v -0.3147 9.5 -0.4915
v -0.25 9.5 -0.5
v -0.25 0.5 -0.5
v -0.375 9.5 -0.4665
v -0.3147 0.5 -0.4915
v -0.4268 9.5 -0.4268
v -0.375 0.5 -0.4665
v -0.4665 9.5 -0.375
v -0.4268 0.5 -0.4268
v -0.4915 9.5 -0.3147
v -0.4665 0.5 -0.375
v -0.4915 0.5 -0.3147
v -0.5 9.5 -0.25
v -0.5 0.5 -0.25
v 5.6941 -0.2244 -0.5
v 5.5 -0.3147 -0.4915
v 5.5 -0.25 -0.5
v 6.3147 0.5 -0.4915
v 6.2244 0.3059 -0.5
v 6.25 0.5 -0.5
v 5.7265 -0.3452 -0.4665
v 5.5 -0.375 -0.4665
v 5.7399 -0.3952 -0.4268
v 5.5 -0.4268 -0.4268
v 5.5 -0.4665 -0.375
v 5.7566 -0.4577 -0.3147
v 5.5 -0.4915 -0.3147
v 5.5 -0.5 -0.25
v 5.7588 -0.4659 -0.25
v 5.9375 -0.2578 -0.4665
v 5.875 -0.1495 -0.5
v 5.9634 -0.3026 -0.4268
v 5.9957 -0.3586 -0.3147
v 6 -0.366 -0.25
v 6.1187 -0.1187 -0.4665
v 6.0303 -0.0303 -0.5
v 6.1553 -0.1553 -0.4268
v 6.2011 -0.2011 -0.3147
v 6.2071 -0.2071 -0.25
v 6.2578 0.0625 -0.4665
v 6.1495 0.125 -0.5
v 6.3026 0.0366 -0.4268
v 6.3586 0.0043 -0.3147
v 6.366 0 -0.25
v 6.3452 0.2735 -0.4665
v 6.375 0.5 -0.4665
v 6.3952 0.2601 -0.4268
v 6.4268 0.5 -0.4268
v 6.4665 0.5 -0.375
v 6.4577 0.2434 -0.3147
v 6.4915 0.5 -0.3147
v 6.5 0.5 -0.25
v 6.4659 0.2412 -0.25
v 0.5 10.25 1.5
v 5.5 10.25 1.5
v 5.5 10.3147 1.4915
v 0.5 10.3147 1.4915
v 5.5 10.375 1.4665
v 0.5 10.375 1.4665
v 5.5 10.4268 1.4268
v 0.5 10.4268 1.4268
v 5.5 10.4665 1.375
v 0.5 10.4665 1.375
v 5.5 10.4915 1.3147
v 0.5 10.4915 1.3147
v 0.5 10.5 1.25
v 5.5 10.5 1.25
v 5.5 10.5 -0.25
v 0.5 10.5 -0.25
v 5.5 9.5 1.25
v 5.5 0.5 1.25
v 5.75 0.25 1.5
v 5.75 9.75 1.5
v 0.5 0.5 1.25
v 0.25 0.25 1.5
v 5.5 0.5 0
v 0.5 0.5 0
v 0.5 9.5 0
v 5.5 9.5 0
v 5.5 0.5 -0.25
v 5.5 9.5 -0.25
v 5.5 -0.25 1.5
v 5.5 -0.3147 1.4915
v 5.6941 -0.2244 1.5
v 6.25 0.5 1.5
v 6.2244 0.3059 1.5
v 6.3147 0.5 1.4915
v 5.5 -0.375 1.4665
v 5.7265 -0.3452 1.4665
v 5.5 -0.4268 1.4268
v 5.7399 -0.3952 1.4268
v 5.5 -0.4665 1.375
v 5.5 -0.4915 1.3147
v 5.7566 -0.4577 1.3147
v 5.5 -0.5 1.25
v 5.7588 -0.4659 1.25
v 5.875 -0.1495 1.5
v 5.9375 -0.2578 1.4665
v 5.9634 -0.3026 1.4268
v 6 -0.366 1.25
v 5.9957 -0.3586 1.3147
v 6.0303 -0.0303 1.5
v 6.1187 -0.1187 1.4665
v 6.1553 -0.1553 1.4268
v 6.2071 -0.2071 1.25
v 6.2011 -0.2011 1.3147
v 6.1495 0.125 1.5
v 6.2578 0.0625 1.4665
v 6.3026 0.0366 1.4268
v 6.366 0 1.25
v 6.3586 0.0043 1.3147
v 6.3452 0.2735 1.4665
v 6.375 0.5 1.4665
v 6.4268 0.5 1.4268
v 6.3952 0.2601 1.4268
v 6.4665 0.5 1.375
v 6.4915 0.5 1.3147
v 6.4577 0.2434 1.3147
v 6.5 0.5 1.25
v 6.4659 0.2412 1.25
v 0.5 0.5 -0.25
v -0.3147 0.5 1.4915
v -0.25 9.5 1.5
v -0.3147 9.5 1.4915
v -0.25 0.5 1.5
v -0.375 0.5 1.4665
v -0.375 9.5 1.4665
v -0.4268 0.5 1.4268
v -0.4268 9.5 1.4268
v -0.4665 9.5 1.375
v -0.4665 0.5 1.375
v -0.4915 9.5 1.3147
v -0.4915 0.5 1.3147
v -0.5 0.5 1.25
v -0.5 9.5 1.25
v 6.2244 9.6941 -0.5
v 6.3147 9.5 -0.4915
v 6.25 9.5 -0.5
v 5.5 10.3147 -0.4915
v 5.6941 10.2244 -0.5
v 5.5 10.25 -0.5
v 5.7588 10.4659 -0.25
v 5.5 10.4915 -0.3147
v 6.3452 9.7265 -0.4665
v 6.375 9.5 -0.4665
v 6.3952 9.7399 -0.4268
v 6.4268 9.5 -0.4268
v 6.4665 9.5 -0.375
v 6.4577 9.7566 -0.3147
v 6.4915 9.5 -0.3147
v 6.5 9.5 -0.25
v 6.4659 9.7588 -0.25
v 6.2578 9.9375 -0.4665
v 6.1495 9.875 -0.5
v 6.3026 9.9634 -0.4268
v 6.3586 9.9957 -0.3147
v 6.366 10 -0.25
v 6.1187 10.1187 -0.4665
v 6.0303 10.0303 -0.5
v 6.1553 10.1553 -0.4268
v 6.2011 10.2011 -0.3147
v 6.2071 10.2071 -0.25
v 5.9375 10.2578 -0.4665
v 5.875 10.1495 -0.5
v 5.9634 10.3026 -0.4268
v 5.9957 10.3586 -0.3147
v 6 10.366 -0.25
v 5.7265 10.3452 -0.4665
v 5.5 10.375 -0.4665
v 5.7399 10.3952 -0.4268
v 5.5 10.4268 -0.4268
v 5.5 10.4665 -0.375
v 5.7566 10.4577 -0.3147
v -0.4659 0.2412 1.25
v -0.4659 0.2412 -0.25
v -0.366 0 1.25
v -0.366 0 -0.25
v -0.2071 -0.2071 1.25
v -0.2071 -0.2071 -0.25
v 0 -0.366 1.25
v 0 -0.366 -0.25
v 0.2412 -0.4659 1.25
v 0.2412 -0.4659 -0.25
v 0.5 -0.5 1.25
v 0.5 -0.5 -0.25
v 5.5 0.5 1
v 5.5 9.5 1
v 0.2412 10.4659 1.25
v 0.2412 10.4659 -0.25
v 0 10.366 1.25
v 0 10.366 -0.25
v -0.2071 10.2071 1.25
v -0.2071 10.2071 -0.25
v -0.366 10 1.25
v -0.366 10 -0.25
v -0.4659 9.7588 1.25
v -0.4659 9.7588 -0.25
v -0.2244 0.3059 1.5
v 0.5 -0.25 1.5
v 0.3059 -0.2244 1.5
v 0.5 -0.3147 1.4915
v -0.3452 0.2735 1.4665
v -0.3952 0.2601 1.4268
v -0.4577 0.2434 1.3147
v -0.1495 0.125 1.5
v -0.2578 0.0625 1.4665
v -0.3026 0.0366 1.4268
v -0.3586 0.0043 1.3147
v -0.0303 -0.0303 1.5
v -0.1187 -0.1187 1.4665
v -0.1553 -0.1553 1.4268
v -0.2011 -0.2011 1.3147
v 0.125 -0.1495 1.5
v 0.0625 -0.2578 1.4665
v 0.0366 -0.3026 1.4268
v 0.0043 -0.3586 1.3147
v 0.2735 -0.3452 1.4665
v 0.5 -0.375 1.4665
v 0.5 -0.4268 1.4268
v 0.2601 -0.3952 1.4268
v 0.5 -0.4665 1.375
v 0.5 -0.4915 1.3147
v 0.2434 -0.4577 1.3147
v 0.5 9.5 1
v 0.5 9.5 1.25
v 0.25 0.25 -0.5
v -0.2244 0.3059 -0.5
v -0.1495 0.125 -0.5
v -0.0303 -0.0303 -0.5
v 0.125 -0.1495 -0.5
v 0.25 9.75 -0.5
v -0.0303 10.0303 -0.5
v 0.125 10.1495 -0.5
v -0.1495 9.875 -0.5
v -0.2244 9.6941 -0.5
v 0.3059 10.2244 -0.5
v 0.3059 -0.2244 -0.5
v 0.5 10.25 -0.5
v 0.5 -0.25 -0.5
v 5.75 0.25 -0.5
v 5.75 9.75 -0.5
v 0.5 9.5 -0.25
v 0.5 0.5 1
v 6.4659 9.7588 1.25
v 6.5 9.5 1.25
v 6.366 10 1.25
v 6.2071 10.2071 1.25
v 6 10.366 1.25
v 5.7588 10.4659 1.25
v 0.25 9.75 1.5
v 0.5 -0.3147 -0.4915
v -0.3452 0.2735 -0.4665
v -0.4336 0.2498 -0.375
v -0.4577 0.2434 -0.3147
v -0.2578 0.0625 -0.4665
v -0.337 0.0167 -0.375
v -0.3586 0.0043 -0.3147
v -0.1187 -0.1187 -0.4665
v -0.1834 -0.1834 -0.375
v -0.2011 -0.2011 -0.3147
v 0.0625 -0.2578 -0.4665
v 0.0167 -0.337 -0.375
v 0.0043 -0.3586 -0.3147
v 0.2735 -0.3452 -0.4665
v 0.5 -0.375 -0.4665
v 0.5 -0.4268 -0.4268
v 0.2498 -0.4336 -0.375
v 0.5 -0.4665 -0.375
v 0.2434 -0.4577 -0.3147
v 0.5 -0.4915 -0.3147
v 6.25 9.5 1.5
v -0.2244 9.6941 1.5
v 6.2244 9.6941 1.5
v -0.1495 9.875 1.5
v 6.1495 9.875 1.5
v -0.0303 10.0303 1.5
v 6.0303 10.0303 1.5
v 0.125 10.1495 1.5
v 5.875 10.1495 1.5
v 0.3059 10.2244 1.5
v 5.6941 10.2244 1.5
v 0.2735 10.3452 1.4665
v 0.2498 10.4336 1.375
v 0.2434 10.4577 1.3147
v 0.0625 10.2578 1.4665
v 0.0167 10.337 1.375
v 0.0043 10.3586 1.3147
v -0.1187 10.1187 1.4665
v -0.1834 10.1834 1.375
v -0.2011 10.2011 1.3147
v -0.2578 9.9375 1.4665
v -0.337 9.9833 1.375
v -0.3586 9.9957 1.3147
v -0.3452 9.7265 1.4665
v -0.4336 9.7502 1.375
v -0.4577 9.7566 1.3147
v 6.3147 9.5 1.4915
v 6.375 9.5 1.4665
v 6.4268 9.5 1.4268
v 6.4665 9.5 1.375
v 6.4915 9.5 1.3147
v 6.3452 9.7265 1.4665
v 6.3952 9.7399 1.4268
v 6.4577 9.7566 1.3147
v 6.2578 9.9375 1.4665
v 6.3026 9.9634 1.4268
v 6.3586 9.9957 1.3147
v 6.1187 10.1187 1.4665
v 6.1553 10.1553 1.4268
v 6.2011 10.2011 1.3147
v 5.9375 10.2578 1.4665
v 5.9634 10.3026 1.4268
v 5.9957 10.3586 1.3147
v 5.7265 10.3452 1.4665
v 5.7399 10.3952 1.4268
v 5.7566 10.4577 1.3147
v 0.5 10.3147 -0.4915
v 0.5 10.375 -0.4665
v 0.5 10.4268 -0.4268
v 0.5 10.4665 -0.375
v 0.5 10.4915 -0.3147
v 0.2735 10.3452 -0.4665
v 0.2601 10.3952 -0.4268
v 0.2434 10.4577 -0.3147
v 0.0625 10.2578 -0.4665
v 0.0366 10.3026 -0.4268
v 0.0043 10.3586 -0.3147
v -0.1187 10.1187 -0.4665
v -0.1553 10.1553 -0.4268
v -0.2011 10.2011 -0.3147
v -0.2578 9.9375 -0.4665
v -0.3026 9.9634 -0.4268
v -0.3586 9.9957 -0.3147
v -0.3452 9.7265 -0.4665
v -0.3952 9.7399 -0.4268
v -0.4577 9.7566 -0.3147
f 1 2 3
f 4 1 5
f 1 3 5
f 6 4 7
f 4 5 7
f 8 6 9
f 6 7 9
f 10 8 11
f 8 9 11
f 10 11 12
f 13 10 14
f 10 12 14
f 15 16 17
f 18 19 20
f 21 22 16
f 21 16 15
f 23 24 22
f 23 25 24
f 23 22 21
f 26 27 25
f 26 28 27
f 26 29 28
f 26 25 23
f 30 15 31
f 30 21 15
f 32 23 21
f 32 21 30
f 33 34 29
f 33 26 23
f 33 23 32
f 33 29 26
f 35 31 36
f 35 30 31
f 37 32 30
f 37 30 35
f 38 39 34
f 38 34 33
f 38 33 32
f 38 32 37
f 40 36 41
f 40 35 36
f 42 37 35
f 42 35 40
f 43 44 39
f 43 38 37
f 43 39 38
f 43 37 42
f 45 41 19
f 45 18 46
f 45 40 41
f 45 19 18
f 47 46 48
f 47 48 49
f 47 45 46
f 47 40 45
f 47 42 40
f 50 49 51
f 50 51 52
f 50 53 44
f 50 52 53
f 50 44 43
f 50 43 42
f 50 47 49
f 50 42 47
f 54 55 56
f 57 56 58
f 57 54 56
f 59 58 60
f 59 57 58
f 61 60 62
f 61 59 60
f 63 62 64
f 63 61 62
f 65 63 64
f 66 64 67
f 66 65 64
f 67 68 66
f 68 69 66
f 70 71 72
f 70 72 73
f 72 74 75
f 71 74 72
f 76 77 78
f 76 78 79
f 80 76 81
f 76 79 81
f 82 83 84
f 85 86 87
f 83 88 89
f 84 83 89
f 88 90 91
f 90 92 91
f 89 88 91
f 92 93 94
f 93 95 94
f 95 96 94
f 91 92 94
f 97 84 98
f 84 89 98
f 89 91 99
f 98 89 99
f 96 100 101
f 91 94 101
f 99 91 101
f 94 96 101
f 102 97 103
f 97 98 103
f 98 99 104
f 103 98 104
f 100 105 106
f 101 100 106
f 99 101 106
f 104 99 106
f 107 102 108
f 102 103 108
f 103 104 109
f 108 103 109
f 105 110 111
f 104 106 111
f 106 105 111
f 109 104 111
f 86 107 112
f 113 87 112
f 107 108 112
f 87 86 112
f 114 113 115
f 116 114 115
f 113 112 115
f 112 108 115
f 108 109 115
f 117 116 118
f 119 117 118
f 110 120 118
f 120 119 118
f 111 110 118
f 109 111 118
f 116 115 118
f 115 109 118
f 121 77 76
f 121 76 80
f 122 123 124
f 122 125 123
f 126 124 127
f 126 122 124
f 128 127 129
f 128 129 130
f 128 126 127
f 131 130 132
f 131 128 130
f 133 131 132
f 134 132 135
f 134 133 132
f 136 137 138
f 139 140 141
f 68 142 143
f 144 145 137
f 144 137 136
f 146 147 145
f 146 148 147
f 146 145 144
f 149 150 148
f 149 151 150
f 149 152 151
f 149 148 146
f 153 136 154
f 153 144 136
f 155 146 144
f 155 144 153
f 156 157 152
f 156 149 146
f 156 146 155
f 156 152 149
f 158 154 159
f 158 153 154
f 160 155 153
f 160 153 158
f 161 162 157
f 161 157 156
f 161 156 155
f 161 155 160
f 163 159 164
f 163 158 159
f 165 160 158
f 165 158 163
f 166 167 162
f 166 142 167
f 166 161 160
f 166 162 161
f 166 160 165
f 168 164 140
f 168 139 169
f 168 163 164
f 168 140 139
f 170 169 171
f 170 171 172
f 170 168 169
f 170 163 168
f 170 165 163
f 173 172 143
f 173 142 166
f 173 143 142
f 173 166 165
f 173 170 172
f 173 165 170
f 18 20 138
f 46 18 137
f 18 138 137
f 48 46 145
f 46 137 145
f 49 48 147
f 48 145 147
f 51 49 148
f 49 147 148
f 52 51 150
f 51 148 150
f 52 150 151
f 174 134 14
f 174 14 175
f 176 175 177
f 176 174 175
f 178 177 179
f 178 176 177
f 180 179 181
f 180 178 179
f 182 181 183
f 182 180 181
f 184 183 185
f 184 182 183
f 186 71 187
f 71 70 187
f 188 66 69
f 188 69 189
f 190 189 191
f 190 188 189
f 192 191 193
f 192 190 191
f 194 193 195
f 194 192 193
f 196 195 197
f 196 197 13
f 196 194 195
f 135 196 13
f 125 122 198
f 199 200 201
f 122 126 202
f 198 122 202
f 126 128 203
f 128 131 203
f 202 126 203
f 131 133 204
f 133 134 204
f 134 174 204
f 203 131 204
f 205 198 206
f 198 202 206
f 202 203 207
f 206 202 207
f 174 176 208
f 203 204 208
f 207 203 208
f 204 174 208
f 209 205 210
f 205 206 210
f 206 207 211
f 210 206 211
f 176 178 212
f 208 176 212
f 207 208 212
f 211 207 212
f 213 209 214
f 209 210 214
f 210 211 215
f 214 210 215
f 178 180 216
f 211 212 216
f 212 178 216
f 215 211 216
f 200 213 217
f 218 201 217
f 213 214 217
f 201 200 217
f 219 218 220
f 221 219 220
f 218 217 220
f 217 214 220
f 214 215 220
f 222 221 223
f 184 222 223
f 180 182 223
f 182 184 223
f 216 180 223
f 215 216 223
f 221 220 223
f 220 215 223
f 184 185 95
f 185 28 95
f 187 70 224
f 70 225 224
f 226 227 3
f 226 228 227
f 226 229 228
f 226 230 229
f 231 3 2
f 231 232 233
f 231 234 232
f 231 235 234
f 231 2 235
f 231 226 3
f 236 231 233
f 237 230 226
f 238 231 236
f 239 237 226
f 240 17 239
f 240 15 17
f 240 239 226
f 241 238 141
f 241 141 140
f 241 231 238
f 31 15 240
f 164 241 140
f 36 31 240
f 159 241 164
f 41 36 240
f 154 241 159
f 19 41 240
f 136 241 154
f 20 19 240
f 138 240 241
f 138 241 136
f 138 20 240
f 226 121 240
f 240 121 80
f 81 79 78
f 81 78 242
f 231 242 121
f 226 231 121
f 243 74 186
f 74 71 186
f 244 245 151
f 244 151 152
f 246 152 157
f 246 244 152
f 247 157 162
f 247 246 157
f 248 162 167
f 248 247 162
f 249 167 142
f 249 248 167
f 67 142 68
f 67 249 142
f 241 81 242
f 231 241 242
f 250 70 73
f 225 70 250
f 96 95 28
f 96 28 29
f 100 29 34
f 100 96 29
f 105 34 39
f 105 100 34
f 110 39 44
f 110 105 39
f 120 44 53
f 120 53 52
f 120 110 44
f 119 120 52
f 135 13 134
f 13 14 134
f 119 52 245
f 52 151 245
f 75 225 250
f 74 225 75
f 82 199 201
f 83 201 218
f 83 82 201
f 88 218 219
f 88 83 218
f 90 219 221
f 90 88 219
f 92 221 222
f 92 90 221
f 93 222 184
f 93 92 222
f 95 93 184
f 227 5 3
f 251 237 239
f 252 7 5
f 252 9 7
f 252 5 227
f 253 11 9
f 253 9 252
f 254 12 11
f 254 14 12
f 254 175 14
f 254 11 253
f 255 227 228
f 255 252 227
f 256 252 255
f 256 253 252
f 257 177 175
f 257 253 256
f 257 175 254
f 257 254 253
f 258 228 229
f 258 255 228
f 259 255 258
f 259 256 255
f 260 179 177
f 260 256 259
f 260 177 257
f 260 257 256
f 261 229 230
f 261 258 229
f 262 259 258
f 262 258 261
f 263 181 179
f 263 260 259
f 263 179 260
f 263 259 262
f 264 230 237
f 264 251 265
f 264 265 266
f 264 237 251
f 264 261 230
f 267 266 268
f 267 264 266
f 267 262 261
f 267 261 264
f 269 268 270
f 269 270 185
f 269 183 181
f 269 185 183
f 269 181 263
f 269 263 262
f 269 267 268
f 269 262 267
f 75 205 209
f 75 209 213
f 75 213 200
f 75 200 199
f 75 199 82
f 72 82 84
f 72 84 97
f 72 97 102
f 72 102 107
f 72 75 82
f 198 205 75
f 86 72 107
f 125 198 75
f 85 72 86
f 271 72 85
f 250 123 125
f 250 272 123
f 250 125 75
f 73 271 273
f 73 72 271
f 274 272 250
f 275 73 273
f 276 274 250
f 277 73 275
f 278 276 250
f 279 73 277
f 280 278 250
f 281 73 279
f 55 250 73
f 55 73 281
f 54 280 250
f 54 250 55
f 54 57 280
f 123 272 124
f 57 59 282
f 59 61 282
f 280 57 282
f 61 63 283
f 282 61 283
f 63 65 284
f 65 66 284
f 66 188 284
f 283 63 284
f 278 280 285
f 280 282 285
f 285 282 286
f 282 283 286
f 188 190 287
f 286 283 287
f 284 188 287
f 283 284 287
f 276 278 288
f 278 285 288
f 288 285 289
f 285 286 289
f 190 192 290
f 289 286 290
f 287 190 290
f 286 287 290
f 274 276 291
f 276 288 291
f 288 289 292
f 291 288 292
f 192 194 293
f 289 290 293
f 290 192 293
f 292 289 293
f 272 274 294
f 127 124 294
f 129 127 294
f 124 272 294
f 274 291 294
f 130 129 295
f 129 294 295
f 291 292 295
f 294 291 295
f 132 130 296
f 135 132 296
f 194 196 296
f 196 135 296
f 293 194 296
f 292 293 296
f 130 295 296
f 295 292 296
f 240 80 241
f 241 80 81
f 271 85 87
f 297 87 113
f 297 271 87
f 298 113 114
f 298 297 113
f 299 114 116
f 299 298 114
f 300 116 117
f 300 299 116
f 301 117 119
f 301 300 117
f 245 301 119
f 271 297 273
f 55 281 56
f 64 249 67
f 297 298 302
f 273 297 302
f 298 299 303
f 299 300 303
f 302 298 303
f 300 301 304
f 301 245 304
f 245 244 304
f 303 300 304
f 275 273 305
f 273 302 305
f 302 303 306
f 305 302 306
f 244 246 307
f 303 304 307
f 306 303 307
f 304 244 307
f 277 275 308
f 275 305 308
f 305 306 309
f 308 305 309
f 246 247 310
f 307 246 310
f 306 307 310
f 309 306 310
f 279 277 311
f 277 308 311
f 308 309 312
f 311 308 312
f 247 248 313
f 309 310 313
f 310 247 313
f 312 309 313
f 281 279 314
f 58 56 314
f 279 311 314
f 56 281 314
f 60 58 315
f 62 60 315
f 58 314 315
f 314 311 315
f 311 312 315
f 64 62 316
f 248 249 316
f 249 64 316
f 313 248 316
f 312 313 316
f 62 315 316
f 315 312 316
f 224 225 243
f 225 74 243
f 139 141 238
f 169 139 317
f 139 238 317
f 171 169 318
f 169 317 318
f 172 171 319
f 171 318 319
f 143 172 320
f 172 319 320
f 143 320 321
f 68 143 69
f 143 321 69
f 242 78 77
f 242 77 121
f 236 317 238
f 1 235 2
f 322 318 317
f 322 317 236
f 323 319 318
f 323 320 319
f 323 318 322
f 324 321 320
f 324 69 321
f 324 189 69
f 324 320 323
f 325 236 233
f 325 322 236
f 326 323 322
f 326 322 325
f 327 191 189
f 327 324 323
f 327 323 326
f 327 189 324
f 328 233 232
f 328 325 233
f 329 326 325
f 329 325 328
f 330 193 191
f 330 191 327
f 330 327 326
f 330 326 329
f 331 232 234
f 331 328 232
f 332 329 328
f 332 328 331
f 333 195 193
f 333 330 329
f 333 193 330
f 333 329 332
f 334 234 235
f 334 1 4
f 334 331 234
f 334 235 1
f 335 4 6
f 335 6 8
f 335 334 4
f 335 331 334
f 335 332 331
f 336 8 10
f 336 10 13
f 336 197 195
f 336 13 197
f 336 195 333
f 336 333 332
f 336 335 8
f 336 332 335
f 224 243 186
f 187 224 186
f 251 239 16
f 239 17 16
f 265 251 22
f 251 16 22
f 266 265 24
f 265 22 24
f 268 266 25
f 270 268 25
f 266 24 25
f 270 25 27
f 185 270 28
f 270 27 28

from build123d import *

# Parameters (mm, degrees)
F0_W     = 6
F0_H     = 10
F1_DEPTH = 1
F2_R     = 0.5
F7_R     = 0.25
F8_SIZE  = 0.25


with BuildPart() as f1:
    # F0 (on Top) → F1 (new body)
    with BuildSketch(Plane.XY):
        with Locations((3, 5)):
            Rectangle(F0_W, F0_H)
    extrude(amount=F1_DEPTH)

    # F2
    f2_edges = [f1.edges().sort_by_distance(p)[0] for p in [
        (6, 0, 0.5),
        (6, 10, 0.5),
        (0, 0, 0.5),
        (0, 10, 0.5),
    ]]
    fillet(f2_edges, radius=F2_R)

    # F6: sweep along a path in F5
    with BuildLine(Plane.XY.offset(1)) as f6_path:
        ThreePointArc((5.5, 0), (5.8535533906, 0.1464466094), (6, 0.5))
        Line((6, 0.5), (6, 9.5))
        ThreePointArc((6, 9.5), (5.8535533906, 9.8535533906), (5.5, 10))
        Line((5.5, 10), (0.5, 10))
        ThreePointArc((0.5, 10), (0.1464466094, 9.8535533906), (0, 9.5))
        Line((0, 9.5), (0, 0.5))
        ThreePointArc((0, 0.5), (0.1464466094, 0.1464466094), (0.5, 0))
        Line((0.5, 0), (5.5, 0))
    # F4 (on offset) → F6 (sweep)
    with BuildSketch(Plane.XZ.offset(-0.5)):
        Polygon((6, 1), (6, 0), (5.5, 0), (5.5, -0.5), (6.5, -0.5), (6.5, 1.5), (5.5, 1.5), (5.5, 1), align=None)
    sweep(path=f6_path.line)

    # F7
    f7_edges = [f1.edges().sort_by_distance(p)[0] for p in [
        (-0.5, 5, 1.5),
        (3, -0.5, -0.5),
    ]]
    fillet(f7_edges, radius=F7_R)

    # F8
    f8_edges = [f1.edges().sort_by_distance(p)[0] for p in [
        (0.5, 5, 1.5),
        (3, 9.5, 1.5),
        (5.5, 5, 1.5),
        (3, 0.5, 1.5),
        (0.5, 5, -0.5),
        (3, 0.5, -0.5),
        (5.5, 5, -0.5),
        (3, 9.5, -0.5),
    ]]
    chamfer(f8_edges, length=F8_SIZE)


solid = f1.part
